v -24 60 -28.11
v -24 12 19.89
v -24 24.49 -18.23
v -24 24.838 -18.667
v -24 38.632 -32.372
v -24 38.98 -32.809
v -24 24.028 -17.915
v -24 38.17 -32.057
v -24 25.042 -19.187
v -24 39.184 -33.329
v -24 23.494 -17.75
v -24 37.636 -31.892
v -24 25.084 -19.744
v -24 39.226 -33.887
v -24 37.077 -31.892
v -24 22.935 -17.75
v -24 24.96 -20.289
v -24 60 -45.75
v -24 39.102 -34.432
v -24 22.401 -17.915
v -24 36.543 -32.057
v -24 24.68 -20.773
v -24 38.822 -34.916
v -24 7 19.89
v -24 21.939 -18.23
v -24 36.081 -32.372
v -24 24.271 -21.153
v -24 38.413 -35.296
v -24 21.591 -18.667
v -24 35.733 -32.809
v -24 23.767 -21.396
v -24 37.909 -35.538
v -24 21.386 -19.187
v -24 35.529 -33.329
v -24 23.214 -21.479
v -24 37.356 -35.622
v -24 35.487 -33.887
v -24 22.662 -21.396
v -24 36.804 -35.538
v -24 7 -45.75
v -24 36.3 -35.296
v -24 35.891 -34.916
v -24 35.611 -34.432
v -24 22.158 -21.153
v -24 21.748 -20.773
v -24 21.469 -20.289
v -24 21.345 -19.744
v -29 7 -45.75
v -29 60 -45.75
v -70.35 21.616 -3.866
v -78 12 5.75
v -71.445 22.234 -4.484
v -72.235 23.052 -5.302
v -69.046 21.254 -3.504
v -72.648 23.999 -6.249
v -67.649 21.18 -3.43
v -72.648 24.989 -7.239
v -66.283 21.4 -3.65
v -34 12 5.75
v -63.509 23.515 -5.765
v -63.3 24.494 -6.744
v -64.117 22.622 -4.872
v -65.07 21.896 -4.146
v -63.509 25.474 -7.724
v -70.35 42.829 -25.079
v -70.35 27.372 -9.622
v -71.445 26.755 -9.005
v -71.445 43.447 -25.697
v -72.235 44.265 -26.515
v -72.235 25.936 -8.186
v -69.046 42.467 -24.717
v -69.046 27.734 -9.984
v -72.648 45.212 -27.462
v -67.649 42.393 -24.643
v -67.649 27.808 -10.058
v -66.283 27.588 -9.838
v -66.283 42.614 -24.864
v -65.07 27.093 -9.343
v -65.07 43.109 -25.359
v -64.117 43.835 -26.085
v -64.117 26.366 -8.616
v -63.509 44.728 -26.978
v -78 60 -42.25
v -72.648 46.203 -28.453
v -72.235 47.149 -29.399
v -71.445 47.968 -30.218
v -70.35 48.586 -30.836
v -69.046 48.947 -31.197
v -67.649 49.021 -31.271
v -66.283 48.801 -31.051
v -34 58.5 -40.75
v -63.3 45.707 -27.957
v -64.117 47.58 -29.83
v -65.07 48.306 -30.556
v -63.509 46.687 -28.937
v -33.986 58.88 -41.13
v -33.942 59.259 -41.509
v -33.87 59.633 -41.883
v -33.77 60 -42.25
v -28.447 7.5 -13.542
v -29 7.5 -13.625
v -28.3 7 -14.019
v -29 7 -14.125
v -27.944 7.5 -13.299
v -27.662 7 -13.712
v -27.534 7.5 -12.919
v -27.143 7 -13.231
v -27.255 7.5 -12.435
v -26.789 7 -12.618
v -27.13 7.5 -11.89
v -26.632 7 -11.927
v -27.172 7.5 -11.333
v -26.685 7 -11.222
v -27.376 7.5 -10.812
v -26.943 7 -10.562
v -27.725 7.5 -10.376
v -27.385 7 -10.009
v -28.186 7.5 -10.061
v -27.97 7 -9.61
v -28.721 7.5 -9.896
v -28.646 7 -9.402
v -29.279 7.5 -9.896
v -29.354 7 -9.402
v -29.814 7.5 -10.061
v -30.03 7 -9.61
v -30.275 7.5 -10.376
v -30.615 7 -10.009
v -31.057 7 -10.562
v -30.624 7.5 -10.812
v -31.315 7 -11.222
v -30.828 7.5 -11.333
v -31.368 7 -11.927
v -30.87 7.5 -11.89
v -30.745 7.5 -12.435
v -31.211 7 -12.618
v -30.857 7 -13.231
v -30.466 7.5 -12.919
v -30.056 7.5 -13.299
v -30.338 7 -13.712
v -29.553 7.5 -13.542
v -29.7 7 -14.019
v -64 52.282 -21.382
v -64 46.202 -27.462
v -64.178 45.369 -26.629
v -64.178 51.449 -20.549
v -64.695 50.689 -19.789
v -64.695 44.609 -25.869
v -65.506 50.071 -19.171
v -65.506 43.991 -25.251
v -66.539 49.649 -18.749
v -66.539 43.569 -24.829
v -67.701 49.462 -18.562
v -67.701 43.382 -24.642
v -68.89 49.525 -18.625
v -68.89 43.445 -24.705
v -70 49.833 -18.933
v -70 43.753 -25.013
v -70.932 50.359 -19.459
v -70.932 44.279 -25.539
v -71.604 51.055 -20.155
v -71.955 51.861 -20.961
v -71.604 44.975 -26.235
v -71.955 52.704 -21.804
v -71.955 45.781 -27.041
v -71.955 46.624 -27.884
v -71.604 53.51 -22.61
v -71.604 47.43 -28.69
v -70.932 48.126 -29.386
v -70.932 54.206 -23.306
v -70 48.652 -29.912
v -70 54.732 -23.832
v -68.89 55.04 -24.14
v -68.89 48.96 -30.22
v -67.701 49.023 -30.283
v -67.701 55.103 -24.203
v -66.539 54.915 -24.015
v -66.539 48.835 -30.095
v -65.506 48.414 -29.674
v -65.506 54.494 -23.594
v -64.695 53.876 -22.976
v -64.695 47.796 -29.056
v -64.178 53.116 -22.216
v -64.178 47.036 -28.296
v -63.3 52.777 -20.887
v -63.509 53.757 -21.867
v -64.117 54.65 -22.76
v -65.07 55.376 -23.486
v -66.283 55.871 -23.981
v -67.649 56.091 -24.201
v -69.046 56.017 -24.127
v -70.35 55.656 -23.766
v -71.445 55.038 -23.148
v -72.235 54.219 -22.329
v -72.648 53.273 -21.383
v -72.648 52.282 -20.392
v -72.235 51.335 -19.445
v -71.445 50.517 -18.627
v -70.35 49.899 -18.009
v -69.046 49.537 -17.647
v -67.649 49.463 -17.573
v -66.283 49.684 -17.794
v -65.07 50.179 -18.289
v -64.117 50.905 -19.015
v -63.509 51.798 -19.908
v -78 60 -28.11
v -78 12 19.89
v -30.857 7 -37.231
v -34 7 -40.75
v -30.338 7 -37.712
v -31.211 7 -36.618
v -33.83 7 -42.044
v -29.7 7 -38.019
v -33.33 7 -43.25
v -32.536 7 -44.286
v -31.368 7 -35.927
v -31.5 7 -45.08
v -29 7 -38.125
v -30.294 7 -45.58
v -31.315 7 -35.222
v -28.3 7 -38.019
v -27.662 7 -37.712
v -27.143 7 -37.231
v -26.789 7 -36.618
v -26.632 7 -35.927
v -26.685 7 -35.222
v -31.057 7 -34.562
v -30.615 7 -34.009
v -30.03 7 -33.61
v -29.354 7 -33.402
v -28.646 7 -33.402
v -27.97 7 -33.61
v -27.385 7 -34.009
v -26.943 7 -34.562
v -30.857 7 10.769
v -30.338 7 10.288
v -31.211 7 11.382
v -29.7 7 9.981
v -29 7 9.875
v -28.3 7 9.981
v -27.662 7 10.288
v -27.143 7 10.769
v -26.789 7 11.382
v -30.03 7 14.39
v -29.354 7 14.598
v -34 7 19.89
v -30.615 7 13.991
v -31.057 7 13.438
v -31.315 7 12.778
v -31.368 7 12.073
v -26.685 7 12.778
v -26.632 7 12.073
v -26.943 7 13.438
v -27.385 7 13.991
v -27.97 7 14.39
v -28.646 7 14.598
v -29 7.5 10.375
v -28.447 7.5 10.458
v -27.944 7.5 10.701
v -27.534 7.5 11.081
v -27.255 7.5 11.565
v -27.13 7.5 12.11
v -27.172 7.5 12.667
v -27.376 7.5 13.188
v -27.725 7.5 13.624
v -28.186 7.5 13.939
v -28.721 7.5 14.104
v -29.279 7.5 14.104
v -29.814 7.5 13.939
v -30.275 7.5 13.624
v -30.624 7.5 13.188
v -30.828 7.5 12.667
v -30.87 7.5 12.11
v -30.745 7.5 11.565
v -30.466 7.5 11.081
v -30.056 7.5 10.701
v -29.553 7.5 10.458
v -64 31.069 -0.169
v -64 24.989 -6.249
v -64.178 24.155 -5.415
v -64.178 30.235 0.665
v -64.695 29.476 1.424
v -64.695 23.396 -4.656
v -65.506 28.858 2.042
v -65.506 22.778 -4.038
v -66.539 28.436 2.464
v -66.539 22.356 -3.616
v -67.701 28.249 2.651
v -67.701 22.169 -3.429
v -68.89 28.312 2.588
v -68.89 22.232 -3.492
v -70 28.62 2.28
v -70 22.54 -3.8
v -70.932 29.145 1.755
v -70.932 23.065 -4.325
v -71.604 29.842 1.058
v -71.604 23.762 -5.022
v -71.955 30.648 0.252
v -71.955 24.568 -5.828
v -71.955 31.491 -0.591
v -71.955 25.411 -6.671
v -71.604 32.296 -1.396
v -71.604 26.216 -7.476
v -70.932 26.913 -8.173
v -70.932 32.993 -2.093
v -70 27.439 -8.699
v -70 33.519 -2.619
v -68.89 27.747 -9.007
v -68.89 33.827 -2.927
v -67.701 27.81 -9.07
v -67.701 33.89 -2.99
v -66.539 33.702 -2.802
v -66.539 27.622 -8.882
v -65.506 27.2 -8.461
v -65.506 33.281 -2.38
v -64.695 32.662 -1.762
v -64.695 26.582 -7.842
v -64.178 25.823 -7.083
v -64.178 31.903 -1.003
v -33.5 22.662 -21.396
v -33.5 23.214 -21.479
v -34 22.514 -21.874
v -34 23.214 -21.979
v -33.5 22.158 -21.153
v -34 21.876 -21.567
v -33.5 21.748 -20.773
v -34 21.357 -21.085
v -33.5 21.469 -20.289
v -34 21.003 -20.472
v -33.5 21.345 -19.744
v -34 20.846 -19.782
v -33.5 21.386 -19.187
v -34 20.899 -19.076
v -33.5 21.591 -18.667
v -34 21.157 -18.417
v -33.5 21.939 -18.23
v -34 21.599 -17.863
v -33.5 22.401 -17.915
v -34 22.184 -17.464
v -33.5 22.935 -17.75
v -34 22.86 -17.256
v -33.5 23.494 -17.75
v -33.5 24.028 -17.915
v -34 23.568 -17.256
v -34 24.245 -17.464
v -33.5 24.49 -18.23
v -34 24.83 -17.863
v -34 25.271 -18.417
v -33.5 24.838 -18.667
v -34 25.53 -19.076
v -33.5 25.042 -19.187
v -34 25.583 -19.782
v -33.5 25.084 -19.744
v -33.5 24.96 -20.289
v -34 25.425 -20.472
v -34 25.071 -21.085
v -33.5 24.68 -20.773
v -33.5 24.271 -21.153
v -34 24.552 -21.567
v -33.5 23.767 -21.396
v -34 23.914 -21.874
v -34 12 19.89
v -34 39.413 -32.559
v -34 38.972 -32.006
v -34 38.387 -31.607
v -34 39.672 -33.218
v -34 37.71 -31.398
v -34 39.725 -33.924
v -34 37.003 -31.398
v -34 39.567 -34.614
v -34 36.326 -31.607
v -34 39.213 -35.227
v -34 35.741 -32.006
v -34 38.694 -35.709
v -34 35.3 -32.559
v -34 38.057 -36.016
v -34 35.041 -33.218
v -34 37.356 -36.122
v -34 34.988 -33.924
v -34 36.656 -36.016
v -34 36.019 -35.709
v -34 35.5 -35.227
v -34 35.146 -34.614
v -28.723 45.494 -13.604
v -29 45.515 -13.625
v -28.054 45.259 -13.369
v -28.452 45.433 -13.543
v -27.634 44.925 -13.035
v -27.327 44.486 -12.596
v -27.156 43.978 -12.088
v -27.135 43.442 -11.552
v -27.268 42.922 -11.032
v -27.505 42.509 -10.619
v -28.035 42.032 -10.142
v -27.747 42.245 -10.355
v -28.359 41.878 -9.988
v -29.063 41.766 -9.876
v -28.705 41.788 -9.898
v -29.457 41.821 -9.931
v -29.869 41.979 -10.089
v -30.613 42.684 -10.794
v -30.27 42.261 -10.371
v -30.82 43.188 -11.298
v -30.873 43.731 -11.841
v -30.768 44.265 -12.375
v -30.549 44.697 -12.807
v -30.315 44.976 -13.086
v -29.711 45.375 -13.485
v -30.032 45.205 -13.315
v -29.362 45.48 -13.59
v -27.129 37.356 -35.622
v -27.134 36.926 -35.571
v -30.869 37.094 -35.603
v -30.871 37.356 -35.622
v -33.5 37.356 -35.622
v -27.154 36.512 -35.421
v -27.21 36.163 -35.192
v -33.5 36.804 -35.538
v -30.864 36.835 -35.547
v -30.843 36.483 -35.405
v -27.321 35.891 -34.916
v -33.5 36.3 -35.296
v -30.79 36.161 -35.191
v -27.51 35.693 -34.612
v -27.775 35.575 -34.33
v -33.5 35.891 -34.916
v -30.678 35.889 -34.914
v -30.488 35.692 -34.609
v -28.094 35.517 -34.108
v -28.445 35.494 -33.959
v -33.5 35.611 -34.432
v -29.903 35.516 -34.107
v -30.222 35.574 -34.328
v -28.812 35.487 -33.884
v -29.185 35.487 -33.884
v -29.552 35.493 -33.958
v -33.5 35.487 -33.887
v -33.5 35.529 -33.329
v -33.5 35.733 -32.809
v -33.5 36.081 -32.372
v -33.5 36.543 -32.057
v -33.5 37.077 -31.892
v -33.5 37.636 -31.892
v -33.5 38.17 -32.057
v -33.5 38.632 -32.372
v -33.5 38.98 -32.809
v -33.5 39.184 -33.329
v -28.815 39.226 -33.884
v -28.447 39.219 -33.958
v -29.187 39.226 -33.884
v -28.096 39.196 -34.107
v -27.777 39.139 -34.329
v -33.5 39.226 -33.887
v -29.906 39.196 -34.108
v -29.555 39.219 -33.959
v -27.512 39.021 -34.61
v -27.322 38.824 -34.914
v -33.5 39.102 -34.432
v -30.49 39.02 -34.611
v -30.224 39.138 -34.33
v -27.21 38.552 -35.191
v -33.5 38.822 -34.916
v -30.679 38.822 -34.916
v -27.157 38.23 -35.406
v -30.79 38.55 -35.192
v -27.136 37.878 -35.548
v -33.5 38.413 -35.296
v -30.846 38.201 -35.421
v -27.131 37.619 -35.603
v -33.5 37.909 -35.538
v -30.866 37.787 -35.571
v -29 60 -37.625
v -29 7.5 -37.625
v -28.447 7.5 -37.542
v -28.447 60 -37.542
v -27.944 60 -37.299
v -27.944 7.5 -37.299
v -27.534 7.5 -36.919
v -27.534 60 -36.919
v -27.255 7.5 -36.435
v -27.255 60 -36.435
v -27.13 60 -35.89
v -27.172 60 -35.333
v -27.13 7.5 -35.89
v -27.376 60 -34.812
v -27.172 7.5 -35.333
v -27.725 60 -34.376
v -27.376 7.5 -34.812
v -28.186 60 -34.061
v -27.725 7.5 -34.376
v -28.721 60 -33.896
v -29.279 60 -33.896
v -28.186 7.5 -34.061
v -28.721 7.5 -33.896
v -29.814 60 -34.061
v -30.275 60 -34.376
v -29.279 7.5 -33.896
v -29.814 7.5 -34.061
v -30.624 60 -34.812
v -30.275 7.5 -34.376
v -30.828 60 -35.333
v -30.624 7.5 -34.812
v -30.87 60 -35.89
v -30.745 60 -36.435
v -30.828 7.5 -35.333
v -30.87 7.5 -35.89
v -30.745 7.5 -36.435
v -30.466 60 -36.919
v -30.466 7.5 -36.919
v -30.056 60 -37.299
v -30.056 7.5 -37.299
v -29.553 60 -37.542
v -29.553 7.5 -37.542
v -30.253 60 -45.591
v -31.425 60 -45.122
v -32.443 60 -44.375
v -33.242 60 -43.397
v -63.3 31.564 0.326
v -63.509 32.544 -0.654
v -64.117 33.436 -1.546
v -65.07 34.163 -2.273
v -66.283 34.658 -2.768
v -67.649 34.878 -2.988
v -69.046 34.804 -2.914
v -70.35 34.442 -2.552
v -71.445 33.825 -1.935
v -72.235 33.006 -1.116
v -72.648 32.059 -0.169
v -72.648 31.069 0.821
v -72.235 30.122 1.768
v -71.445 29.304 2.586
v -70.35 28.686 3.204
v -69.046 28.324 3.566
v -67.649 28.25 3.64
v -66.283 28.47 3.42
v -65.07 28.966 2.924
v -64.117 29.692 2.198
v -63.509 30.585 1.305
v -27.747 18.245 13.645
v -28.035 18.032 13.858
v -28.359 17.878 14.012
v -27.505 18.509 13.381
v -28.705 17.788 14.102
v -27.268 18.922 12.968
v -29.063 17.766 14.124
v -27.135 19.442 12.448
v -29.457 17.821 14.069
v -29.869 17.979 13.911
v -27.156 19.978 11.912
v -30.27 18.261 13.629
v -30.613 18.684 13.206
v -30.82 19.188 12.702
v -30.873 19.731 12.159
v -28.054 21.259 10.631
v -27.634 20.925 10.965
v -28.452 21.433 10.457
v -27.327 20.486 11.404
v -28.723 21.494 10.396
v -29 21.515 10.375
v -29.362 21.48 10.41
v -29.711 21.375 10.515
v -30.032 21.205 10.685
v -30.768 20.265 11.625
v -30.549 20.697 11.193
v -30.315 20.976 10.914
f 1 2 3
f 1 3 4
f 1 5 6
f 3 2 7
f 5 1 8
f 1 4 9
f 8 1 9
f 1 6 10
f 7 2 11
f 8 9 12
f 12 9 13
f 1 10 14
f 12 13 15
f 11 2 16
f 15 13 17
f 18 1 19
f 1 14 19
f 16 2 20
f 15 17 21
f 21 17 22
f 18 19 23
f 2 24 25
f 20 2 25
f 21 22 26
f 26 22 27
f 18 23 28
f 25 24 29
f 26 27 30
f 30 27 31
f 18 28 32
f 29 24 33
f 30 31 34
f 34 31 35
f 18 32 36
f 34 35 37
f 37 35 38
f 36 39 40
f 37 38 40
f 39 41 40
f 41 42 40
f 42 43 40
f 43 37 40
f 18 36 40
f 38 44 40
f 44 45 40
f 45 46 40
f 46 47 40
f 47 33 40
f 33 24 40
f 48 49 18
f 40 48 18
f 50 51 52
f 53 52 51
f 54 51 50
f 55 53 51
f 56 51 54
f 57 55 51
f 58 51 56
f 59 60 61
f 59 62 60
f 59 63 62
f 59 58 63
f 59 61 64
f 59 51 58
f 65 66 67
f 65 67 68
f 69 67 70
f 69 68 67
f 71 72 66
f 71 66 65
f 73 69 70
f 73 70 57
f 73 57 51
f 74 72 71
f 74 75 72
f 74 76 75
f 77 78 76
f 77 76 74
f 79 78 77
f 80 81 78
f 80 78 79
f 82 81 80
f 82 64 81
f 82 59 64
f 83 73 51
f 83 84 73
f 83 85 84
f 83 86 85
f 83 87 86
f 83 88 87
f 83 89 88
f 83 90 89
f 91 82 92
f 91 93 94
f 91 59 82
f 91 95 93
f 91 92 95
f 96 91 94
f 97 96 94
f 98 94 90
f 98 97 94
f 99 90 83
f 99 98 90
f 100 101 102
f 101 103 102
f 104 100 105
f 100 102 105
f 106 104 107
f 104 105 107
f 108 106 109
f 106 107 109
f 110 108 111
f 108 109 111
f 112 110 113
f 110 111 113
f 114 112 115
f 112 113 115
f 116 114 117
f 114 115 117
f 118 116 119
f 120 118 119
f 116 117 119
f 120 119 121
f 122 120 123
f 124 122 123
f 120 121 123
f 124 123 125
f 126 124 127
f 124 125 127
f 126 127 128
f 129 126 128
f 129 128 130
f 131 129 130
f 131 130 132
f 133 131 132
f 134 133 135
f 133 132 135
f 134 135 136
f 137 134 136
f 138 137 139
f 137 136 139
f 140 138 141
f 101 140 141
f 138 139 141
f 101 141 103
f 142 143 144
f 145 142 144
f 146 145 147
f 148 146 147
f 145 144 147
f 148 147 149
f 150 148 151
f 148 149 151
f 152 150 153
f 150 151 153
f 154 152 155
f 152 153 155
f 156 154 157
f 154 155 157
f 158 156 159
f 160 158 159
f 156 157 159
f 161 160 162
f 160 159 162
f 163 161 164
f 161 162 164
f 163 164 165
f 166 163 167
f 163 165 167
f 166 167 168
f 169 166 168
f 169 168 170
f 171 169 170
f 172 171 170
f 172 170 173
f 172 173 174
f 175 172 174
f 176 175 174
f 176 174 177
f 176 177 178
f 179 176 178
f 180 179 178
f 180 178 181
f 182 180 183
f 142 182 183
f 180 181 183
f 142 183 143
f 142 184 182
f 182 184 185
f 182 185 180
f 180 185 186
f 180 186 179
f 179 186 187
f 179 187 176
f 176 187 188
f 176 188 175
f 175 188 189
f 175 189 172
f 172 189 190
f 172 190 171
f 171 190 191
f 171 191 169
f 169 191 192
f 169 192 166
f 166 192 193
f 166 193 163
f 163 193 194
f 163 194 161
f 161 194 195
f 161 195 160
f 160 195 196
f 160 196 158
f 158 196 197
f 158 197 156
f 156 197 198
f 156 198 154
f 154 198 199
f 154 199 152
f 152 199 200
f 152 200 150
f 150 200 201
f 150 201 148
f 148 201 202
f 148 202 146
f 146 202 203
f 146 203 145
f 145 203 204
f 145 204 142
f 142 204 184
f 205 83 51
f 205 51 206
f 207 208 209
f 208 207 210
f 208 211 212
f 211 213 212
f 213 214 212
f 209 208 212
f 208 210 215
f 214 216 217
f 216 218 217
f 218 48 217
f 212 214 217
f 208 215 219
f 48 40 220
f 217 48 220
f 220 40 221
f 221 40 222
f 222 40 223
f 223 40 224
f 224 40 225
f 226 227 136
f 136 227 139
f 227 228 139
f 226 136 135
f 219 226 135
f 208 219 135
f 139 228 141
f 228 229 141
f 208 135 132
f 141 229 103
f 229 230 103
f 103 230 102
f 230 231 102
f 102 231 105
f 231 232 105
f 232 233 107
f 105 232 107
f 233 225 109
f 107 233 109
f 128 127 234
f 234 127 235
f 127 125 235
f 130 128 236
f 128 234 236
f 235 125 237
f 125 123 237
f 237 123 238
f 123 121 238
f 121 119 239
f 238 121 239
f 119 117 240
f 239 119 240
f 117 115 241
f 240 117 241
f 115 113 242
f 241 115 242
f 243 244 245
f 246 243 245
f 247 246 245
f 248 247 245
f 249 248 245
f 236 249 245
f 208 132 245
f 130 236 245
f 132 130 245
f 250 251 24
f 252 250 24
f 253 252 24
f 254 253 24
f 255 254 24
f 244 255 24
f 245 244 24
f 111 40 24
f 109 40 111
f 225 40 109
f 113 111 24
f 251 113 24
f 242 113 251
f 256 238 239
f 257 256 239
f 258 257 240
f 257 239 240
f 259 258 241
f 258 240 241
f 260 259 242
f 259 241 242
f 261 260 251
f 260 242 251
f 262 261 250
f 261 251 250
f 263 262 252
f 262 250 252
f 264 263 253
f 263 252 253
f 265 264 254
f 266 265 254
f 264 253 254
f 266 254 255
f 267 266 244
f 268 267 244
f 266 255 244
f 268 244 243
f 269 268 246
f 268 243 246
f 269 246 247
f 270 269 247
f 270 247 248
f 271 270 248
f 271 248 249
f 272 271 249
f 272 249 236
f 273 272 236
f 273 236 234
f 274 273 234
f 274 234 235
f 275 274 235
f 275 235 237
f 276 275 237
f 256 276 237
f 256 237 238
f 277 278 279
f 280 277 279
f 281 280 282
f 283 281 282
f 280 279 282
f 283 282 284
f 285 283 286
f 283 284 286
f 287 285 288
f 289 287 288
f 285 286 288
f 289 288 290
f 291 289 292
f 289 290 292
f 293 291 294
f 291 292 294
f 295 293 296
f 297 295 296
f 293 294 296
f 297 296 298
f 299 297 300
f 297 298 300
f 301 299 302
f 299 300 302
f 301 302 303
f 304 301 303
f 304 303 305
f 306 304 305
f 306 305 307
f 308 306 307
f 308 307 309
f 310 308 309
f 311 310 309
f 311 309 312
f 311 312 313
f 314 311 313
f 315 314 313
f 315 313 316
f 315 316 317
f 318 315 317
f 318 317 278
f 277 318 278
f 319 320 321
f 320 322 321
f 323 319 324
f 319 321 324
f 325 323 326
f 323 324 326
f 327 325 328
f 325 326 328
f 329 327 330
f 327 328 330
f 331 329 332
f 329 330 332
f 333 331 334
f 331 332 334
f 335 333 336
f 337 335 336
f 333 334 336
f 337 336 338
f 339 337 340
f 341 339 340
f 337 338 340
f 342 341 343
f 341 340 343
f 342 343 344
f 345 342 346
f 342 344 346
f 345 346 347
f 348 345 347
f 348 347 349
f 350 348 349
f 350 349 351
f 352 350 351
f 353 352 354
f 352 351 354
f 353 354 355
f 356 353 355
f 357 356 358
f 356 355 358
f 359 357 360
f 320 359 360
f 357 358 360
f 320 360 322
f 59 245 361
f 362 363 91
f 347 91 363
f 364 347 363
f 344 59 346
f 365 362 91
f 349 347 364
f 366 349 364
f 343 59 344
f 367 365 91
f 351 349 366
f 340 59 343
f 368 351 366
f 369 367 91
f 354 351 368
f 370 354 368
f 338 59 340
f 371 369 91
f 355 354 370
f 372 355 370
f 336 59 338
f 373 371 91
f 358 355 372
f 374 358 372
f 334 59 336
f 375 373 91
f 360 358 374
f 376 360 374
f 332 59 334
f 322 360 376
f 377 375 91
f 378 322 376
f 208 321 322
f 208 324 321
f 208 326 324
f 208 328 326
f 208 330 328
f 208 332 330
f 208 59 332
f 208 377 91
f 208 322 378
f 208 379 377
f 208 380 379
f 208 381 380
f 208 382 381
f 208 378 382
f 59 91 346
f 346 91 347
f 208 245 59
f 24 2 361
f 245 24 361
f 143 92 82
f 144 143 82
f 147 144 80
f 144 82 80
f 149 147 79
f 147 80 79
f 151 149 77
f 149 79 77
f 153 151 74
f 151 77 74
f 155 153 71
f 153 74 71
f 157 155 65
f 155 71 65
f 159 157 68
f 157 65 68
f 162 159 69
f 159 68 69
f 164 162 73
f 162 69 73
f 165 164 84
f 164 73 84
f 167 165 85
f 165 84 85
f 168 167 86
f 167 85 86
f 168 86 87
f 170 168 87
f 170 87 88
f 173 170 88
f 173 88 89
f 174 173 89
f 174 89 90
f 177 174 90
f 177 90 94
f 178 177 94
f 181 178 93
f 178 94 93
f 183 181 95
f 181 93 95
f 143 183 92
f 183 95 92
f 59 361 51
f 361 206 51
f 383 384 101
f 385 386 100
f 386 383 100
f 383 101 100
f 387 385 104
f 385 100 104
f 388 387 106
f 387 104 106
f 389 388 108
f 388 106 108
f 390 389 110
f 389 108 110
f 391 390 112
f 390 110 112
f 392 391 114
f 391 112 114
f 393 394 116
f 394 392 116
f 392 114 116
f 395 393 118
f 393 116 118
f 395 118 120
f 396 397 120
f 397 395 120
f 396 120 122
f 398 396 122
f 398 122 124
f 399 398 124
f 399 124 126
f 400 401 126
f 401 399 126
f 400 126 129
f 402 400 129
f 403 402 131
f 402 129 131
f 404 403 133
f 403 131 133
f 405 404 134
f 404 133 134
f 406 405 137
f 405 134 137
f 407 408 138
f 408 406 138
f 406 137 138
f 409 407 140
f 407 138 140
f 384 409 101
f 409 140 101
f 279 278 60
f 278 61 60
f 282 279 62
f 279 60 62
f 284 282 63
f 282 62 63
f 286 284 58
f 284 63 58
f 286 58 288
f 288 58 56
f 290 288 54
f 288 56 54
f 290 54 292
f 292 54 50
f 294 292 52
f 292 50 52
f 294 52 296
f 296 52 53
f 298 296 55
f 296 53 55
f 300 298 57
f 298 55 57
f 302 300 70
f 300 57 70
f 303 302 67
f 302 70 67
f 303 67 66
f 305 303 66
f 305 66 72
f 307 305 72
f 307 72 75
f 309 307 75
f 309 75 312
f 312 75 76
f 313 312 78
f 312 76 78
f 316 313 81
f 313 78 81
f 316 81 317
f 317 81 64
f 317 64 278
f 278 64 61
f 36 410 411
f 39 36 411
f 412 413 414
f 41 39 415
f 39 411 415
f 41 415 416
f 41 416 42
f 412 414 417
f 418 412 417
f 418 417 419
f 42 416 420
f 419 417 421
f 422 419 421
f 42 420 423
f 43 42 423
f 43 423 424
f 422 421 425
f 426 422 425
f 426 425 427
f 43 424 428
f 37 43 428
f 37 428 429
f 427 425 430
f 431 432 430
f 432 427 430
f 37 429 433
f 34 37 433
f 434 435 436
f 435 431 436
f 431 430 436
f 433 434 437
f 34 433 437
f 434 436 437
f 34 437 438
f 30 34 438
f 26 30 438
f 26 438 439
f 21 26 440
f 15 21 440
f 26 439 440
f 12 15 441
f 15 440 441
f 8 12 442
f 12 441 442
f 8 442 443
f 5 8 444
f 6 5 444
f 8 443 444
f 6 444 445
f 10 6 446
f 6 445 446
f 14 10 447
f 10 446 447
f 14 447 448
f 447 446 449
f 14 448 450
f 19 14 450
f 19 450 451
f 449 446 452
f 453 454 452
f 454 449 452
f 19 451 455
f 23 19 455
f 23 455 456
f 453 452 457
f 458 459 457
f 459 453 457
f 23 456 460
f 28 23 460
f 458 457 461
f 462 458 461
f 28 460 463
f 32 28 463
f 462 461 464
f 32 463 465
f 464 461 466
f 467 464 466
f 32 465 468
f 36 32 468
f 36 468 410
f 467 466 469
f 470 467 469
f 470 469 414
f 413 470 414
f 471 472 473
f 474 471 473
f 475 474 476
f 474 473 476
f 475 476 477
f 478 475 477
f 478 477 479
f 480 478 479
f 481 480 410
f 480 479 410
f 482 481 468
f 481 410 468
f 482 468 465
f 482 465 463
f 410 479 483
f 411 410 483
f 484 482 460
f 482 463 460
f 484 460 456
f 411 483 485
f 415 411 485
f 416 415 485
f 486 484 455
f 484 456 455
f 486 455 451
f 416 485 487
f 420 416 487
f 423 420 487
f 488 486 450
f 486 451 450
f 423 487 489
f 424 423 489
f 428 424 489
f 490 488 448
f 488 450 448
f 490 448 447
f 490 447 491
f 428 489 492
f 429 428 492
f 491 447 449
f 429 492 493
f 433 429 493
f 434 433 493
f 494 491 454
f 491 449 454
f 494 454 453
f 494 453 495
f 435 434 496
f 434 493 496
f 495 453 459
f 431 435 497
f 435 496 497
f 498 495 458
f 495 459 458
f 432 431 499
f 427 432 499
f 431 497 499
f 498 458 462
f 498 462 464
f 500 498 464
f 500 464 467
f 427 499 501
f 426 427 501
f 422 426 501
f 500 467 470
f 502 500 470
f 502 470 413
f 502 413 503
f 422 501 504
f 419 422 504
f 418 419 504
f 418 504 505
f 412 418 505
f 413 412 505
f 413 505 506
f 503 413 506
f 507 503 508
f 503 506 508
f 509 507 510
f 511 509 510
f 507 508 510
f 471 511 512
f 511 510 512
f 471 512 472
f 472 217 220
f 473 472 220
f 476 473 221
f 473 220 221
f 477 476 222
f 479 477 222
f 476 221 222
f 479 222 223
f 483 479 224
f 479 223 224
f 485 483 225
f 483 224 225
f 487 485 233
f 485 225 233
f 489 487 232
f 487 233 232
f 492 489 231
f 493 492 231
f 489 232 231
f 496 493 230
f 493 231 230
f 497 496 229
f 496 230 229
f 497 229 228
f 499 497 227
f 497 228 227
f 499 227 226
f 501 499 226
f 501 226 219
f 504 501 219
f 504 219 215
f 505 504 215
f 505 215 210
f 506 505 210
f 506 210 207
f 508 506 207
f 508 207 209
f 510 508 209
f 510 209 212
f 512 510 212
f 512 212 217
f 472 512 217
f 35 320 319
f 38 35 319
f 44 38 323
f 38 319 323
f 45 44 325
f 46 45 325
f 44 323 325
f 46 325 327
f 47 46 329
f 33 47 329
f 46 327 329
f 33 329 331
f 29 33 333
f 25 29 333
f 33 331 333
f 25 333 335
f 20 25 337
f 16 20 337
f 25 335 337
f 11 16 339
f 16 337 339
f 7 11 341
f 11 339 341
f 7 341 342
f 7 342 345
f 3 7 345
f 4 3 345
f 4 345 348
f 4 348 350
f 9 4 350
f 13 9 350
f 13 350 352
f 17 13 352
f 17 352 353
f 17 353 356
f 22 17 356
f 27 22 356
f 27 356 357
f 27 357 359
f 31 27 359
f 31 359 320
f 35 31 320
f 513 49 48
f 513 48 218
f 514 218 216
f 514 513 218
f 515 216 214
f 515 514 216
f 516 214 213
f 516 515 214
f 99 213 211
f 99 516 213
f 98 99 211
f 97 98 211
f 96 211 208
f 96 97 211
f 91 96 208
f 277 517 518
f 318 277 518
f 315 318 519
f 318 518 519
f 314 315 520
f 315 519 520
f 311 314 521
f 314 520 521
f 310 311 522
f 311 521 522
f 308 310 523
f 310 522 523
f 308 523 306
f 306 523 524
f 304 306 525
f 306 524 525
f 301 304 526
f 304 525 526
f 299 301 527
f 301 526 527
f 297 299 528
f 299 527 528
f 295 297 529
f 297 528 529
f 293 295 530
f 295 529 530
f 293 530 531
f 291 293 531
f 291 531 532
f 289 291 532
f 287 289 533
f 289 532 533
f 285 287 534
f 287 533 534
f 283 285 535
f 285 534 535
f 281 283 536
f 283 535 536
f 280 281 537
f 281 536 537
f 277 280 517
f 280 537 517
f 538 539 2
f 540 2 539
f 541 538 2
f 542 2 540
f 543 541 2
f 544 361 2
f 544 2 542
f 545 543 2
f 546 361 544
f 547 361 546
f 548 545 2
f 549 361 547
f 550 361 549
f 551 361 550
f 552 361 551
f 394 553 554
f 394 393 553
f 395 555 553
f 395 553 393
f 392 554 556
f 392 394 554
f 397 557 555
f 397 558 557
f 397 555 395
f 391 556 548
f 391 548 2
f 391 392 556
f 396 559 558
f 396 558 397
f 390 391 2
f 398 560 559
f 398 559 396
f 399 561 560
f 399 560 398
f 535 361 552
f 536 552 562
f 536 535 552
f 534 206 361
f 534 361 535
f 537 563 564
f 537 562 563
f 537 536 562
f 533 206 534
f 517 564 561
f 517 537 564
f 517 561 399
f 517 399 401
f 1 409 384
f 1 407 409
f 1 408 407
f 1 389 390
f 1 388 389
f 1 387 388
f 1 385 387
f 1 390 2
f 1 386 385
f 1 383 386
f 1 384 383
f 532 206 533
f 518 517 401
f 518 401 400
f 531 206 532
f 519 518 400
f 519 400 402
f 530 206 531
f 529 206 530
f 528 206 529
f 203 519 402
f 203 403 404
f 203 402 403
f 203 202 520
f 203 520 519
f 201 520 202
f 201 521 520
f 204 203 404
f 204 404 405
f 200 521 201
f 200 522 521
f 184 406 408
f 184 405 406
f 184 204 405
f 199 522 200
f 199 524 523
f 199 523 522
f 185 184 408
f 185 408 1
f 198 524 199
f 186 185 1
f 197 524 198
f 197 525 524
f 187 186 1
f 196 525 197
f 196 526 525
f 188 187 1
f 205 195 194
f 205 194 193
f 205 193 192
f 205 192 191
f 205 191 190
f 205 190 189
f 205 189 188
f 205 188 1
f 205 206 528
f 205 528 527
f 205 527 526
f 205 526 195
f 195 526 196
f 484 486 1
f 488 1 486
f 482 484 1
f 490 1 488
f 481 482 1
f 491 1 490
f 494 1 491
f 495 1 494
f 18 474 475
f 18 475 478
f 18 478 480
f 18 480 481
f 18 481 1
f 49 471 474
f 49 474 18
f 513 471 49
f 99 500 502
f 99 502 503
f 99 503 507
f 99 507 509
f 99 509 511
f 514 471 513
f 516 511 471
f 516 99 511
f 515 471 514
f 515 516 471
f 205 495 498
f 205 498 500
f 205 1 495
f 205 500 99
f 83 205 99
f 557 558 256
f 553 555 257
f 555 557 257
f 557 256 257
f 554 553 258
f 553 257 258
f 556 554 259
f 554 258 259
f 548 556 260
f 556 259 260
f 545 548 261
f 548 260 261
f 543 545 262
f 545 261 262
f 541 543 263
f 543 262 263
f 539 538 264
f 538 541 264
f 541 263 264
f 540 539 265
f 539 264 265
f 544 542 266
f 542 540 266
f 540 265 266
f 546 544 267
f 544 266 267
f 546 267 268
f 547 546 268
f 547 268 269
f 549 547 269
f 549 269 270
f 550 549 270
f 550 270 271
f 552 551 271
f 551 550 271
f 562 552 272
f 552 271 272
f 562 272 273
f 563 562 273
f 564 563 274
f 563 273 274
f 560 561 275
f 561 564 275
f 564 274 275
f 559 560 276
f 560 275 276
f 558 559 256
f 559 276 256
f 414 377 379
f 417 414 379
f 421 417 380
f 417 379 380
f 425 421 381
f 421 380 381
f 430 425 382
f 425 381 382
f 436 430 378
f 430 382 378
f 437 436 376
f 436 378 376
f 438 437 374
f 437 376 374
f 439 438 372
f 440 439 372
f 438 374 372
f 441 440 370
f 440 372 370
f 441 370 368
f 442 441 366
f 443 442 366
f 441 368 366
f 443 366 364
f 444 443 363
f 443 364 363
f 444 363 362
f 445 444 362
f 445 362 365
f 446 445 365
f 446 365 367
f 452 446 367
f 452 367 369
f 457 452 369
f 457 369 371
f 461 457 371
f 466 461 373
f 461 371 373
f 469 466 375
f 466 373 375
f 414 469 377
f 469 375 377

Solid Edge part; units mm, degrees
sketch "Sketch1" plane through (0, 0, 0) normal (0, -1, 0) x (1, 0, 0)
  line L0 (-34, -45.75) -> (34, -45.75)
  line L1 (34, -45.75) -> (34, 45.75)
  line L2 (34, 45.75) -> (-34, 45.75)
  line L3 (-34, 45.75) -> (-34, -45.75)
  dimension "D1" = 68
  dimension "D2" = 91.5
extrude "Protrusion1" add sketch "Sketch1" against normal blind 12
sketch "Sketch2" plane through (0, 0, 0) normal (0, -1, 0) x (1, 0, 0)
  circle A0 centre (0, -14.75) radius 11.25
  circle A1 centre (-15.5, 0.75) radius 1.7
  circle A2 centre (-15.5, -30.25) radius 1.7
  circle A3 centre (15.5, -30.25) radius 1.7
  circle A4 centre (15.5, 0.75) radius 1.7
  dimension "D1" = 22.5
  dimension "D2" = 3.4
  dimension "D3" = 31
  dimension "D4" = 31
extrude "Cutout1" cut sketch "Sketch2" against normal through all
sketch "Sketch3" plane through (0, 0, 0) normal (0, -1, 0) x (1, 0, 0)
  circle A0 centre (7.7782, 36.0282) radius 1.4
  circle A1 centre (7.7782, 20.4718) radius 1.4
  circle A2 centre (-7.7782, 20.4718) radius 1.4
  circle A3 centre (-7.7782, 36.0282) radius 1.4
  circle A4 centre (0, 28.25) radius 6
  dimension "D1" = 7.7782
extrude "Cutout2" cut sketch "Sketch3" against normal through all
sketch "Sketch4" plane through (-34, 6, 0) normal (-1, 0, 0) x (0, 0, -1)
  line L0 (-19.89, -6) -> (45.75, -71.64)
  line L1 (45.75, -71.64) -> (45.75, -6)
  line L2 (45.75, -6) -> (-19.89, -6)
  dimension "D1" = 25.86
extrude "Extrusionsausprägung_2" add sketch "Sketch4" against normal blind 10
sketch "Sketch5" plane through (-34, 38.82, 0) normal (-1, 0, 0) x (0, 0, -1)
  circle A0 centre (33.7465, 1.4635) radius 1.875
  circle A1 centre (19.6043, 15.6057) radius 1.875
  dimension "D1" = 3.75
  dimension "D2" = 20
  dimension "D3" = 42.14
  dimension "D4" = 32.83
extrude "Extrusionsausschnitt_3" cut sketch "Sketch5" against normal blind 14
sketch "Sketch6" plane through (-34, 38.82, 0) normal (-1, 0, 0) x (0, 0, -1)
  line L0 (45.75, -38.82) -> (-31.89, 38.82)
  line L1 (-31.89, 38.82) -> (-17.75, 38.82)
  line L2 (-17.75, 38.82) -> (45.75, -24.68)
  line L3 (45.75, -24.68) -> (45.75, -38.82)
  dimension "D1" = 14.14
extrude "Extrusionsausprägung_4" add sketch "Sketch6" along normal blind 44
sketch "Sketch7" plane through (-54, 31.75, -14) normal (0, -0.7071068, -0.7071068) x (1, 0, 0)
  circle A0 centre (-14, 10.2613) radius 4
  circle A1 centre (-14, -19.7387) radius 4
  dimension "D1" = 8
  dimension "D2" = 34.64
  dimension "D3" = 30
  dimension "D4" = 10
extrude "Cutout3" cut sketch "Sketch7" against normal up to next
mirror "Mirror1" [suppressed]
sketch "Sketch8" plane through (-78, 38.82, -6.93) normal (-1, 0, 0) x (0, 0.7071068, -0.7071068)
  line L0 (29.953, 0) -> (42.4264, 12.4734)
  dimension "D1" = 60
extrude "Cutout4" cut sketch "Sketch8" against normal through all material side at (-78, 60.05, -36.93)
mirror "Mirror2" [suppressed]
fillet "Verrundung_1" radius 5 2 edges at (34, 6, -45.75) (-34, 30, -45.75)
chamfer "Fase_1" distance 0.5 angle 45 2 edges at (-34, 23.2143, -17.7293) (-34, 37.3565, -31.8715)
chamfer "Fase_2" distance 0.4 angle 45 4 edges at (-17.2, 0, -30.25) (-17.2, 0, 0.75) (13.8, 0, 0.75) (13.8, 0, -30.25)
chamfer "Fase_3" distance 0.4 angle 45 4 edges at (-9.1782, 0, 20.4718) (-9.1782, 0, 36.0282) (6.3782, 0, 36.0282) (6.3782, 0, 20.4718)
chamfer "Fase_4" distance 2.5 angle 45 2 edges at (-11.25, 0, -14.75) (0, 12, -3.5)
chamfer "Fase_5" distance 1.4 angle 45 2 edges at (-6, 0, 28.25) (0, 12, 34.25)
sketch "Sketch9" plane through (-78, 30, -5.18) normal (-1, 0, 0) x (0, 0.7071068, -0.7071068)
  line L0 (-30.4551, -4.9992) -> (-20.4566, 4.9992)
extrude "Extrusionsausschnitt_8" cut sketch "Sketch9" against normal blind 44 material side at (-78, 11.95, 12.82)
sketch "Sketch10" plane through (-78, 36, -11.18) normal (-1, 0, 0) x (0, 0.7071068, -0.7071068)
  line L0 (-57.2262, -23.285) -> (7.4741, 41.4152)
extrude "Cutout5" cut sketch "Sketch10" against normal through all material side at (-78, 11.95, 0)
sketch "Sketch11" plane through (-51, 12, -12.93) normal (0, -1, 0) x (0, 0, -1)
  circle A0 centre (22.82, 22) radius 1.875
  circle A1 centre (-1.18, 22) radius 1.875
  circle A2 centre (-25.18, 22) radius 1.875
  dimension "D1" = 3.75
  dimension "D2" = 24
  dimension "D3" = 24
  dimension "D4" = 10
extrude "Cutout6" cut sketch "Sketch11" against normal through all
sketch "Sketch12" plane through (-51, 12, -12.93) normal (0, -1, 0) x (0, 0, -1)
  line L0 (32.82, 27) -> (32.82, 22)
  line L1 (-32.82, 27) -> (32.82, 27)
  line L2 (-32.82, 27) -> (-32.82, 17)
  line L3 (-32.82, 17) -> (-18.68, 17)
  line L4 (-18.68, 17) -> (27.82, 17)
  arc A0 (27.82, 17) -> (32.82, 22) centre (27.82, 22) ccw
extrude "Extrusionsausprägung_6" add sketch "Sketch12" along normal blind 5
sketch "Sketch13" plane through (-29, 7, -12.93) normal (0, -1, 0) x (0, 0, -1)
  circle A0 centre (22.82, 0) radius 1.875
  circle A1 centre (-1.18, 0) radius 1.875
  circle A2 centre (-25.18, 0) radius 1.875
  dimension "D1" = 3.75
  dimension "D2" = 10
  dimension "D3" = 24
  dimension "D4" = 24
extrude "Cutout7" cut sketch "Sketch13" against normal through all
chamfer "Fase_9" distance 0.5 angle 45 3 edges at (-29, 7, -9.875) (-29, 7, 14.125) (-29, 7, -33.875)
chamfer "Fase_10" distance 0.7 angle 45 4 edges at (-72, 24.4942, -6.7442) (-72, 45.7074, -27.9574) (-68, 55.6058, -23.7158) (-68, 34.3926, -2.5026)
properties material "Nylon, allgemein"
